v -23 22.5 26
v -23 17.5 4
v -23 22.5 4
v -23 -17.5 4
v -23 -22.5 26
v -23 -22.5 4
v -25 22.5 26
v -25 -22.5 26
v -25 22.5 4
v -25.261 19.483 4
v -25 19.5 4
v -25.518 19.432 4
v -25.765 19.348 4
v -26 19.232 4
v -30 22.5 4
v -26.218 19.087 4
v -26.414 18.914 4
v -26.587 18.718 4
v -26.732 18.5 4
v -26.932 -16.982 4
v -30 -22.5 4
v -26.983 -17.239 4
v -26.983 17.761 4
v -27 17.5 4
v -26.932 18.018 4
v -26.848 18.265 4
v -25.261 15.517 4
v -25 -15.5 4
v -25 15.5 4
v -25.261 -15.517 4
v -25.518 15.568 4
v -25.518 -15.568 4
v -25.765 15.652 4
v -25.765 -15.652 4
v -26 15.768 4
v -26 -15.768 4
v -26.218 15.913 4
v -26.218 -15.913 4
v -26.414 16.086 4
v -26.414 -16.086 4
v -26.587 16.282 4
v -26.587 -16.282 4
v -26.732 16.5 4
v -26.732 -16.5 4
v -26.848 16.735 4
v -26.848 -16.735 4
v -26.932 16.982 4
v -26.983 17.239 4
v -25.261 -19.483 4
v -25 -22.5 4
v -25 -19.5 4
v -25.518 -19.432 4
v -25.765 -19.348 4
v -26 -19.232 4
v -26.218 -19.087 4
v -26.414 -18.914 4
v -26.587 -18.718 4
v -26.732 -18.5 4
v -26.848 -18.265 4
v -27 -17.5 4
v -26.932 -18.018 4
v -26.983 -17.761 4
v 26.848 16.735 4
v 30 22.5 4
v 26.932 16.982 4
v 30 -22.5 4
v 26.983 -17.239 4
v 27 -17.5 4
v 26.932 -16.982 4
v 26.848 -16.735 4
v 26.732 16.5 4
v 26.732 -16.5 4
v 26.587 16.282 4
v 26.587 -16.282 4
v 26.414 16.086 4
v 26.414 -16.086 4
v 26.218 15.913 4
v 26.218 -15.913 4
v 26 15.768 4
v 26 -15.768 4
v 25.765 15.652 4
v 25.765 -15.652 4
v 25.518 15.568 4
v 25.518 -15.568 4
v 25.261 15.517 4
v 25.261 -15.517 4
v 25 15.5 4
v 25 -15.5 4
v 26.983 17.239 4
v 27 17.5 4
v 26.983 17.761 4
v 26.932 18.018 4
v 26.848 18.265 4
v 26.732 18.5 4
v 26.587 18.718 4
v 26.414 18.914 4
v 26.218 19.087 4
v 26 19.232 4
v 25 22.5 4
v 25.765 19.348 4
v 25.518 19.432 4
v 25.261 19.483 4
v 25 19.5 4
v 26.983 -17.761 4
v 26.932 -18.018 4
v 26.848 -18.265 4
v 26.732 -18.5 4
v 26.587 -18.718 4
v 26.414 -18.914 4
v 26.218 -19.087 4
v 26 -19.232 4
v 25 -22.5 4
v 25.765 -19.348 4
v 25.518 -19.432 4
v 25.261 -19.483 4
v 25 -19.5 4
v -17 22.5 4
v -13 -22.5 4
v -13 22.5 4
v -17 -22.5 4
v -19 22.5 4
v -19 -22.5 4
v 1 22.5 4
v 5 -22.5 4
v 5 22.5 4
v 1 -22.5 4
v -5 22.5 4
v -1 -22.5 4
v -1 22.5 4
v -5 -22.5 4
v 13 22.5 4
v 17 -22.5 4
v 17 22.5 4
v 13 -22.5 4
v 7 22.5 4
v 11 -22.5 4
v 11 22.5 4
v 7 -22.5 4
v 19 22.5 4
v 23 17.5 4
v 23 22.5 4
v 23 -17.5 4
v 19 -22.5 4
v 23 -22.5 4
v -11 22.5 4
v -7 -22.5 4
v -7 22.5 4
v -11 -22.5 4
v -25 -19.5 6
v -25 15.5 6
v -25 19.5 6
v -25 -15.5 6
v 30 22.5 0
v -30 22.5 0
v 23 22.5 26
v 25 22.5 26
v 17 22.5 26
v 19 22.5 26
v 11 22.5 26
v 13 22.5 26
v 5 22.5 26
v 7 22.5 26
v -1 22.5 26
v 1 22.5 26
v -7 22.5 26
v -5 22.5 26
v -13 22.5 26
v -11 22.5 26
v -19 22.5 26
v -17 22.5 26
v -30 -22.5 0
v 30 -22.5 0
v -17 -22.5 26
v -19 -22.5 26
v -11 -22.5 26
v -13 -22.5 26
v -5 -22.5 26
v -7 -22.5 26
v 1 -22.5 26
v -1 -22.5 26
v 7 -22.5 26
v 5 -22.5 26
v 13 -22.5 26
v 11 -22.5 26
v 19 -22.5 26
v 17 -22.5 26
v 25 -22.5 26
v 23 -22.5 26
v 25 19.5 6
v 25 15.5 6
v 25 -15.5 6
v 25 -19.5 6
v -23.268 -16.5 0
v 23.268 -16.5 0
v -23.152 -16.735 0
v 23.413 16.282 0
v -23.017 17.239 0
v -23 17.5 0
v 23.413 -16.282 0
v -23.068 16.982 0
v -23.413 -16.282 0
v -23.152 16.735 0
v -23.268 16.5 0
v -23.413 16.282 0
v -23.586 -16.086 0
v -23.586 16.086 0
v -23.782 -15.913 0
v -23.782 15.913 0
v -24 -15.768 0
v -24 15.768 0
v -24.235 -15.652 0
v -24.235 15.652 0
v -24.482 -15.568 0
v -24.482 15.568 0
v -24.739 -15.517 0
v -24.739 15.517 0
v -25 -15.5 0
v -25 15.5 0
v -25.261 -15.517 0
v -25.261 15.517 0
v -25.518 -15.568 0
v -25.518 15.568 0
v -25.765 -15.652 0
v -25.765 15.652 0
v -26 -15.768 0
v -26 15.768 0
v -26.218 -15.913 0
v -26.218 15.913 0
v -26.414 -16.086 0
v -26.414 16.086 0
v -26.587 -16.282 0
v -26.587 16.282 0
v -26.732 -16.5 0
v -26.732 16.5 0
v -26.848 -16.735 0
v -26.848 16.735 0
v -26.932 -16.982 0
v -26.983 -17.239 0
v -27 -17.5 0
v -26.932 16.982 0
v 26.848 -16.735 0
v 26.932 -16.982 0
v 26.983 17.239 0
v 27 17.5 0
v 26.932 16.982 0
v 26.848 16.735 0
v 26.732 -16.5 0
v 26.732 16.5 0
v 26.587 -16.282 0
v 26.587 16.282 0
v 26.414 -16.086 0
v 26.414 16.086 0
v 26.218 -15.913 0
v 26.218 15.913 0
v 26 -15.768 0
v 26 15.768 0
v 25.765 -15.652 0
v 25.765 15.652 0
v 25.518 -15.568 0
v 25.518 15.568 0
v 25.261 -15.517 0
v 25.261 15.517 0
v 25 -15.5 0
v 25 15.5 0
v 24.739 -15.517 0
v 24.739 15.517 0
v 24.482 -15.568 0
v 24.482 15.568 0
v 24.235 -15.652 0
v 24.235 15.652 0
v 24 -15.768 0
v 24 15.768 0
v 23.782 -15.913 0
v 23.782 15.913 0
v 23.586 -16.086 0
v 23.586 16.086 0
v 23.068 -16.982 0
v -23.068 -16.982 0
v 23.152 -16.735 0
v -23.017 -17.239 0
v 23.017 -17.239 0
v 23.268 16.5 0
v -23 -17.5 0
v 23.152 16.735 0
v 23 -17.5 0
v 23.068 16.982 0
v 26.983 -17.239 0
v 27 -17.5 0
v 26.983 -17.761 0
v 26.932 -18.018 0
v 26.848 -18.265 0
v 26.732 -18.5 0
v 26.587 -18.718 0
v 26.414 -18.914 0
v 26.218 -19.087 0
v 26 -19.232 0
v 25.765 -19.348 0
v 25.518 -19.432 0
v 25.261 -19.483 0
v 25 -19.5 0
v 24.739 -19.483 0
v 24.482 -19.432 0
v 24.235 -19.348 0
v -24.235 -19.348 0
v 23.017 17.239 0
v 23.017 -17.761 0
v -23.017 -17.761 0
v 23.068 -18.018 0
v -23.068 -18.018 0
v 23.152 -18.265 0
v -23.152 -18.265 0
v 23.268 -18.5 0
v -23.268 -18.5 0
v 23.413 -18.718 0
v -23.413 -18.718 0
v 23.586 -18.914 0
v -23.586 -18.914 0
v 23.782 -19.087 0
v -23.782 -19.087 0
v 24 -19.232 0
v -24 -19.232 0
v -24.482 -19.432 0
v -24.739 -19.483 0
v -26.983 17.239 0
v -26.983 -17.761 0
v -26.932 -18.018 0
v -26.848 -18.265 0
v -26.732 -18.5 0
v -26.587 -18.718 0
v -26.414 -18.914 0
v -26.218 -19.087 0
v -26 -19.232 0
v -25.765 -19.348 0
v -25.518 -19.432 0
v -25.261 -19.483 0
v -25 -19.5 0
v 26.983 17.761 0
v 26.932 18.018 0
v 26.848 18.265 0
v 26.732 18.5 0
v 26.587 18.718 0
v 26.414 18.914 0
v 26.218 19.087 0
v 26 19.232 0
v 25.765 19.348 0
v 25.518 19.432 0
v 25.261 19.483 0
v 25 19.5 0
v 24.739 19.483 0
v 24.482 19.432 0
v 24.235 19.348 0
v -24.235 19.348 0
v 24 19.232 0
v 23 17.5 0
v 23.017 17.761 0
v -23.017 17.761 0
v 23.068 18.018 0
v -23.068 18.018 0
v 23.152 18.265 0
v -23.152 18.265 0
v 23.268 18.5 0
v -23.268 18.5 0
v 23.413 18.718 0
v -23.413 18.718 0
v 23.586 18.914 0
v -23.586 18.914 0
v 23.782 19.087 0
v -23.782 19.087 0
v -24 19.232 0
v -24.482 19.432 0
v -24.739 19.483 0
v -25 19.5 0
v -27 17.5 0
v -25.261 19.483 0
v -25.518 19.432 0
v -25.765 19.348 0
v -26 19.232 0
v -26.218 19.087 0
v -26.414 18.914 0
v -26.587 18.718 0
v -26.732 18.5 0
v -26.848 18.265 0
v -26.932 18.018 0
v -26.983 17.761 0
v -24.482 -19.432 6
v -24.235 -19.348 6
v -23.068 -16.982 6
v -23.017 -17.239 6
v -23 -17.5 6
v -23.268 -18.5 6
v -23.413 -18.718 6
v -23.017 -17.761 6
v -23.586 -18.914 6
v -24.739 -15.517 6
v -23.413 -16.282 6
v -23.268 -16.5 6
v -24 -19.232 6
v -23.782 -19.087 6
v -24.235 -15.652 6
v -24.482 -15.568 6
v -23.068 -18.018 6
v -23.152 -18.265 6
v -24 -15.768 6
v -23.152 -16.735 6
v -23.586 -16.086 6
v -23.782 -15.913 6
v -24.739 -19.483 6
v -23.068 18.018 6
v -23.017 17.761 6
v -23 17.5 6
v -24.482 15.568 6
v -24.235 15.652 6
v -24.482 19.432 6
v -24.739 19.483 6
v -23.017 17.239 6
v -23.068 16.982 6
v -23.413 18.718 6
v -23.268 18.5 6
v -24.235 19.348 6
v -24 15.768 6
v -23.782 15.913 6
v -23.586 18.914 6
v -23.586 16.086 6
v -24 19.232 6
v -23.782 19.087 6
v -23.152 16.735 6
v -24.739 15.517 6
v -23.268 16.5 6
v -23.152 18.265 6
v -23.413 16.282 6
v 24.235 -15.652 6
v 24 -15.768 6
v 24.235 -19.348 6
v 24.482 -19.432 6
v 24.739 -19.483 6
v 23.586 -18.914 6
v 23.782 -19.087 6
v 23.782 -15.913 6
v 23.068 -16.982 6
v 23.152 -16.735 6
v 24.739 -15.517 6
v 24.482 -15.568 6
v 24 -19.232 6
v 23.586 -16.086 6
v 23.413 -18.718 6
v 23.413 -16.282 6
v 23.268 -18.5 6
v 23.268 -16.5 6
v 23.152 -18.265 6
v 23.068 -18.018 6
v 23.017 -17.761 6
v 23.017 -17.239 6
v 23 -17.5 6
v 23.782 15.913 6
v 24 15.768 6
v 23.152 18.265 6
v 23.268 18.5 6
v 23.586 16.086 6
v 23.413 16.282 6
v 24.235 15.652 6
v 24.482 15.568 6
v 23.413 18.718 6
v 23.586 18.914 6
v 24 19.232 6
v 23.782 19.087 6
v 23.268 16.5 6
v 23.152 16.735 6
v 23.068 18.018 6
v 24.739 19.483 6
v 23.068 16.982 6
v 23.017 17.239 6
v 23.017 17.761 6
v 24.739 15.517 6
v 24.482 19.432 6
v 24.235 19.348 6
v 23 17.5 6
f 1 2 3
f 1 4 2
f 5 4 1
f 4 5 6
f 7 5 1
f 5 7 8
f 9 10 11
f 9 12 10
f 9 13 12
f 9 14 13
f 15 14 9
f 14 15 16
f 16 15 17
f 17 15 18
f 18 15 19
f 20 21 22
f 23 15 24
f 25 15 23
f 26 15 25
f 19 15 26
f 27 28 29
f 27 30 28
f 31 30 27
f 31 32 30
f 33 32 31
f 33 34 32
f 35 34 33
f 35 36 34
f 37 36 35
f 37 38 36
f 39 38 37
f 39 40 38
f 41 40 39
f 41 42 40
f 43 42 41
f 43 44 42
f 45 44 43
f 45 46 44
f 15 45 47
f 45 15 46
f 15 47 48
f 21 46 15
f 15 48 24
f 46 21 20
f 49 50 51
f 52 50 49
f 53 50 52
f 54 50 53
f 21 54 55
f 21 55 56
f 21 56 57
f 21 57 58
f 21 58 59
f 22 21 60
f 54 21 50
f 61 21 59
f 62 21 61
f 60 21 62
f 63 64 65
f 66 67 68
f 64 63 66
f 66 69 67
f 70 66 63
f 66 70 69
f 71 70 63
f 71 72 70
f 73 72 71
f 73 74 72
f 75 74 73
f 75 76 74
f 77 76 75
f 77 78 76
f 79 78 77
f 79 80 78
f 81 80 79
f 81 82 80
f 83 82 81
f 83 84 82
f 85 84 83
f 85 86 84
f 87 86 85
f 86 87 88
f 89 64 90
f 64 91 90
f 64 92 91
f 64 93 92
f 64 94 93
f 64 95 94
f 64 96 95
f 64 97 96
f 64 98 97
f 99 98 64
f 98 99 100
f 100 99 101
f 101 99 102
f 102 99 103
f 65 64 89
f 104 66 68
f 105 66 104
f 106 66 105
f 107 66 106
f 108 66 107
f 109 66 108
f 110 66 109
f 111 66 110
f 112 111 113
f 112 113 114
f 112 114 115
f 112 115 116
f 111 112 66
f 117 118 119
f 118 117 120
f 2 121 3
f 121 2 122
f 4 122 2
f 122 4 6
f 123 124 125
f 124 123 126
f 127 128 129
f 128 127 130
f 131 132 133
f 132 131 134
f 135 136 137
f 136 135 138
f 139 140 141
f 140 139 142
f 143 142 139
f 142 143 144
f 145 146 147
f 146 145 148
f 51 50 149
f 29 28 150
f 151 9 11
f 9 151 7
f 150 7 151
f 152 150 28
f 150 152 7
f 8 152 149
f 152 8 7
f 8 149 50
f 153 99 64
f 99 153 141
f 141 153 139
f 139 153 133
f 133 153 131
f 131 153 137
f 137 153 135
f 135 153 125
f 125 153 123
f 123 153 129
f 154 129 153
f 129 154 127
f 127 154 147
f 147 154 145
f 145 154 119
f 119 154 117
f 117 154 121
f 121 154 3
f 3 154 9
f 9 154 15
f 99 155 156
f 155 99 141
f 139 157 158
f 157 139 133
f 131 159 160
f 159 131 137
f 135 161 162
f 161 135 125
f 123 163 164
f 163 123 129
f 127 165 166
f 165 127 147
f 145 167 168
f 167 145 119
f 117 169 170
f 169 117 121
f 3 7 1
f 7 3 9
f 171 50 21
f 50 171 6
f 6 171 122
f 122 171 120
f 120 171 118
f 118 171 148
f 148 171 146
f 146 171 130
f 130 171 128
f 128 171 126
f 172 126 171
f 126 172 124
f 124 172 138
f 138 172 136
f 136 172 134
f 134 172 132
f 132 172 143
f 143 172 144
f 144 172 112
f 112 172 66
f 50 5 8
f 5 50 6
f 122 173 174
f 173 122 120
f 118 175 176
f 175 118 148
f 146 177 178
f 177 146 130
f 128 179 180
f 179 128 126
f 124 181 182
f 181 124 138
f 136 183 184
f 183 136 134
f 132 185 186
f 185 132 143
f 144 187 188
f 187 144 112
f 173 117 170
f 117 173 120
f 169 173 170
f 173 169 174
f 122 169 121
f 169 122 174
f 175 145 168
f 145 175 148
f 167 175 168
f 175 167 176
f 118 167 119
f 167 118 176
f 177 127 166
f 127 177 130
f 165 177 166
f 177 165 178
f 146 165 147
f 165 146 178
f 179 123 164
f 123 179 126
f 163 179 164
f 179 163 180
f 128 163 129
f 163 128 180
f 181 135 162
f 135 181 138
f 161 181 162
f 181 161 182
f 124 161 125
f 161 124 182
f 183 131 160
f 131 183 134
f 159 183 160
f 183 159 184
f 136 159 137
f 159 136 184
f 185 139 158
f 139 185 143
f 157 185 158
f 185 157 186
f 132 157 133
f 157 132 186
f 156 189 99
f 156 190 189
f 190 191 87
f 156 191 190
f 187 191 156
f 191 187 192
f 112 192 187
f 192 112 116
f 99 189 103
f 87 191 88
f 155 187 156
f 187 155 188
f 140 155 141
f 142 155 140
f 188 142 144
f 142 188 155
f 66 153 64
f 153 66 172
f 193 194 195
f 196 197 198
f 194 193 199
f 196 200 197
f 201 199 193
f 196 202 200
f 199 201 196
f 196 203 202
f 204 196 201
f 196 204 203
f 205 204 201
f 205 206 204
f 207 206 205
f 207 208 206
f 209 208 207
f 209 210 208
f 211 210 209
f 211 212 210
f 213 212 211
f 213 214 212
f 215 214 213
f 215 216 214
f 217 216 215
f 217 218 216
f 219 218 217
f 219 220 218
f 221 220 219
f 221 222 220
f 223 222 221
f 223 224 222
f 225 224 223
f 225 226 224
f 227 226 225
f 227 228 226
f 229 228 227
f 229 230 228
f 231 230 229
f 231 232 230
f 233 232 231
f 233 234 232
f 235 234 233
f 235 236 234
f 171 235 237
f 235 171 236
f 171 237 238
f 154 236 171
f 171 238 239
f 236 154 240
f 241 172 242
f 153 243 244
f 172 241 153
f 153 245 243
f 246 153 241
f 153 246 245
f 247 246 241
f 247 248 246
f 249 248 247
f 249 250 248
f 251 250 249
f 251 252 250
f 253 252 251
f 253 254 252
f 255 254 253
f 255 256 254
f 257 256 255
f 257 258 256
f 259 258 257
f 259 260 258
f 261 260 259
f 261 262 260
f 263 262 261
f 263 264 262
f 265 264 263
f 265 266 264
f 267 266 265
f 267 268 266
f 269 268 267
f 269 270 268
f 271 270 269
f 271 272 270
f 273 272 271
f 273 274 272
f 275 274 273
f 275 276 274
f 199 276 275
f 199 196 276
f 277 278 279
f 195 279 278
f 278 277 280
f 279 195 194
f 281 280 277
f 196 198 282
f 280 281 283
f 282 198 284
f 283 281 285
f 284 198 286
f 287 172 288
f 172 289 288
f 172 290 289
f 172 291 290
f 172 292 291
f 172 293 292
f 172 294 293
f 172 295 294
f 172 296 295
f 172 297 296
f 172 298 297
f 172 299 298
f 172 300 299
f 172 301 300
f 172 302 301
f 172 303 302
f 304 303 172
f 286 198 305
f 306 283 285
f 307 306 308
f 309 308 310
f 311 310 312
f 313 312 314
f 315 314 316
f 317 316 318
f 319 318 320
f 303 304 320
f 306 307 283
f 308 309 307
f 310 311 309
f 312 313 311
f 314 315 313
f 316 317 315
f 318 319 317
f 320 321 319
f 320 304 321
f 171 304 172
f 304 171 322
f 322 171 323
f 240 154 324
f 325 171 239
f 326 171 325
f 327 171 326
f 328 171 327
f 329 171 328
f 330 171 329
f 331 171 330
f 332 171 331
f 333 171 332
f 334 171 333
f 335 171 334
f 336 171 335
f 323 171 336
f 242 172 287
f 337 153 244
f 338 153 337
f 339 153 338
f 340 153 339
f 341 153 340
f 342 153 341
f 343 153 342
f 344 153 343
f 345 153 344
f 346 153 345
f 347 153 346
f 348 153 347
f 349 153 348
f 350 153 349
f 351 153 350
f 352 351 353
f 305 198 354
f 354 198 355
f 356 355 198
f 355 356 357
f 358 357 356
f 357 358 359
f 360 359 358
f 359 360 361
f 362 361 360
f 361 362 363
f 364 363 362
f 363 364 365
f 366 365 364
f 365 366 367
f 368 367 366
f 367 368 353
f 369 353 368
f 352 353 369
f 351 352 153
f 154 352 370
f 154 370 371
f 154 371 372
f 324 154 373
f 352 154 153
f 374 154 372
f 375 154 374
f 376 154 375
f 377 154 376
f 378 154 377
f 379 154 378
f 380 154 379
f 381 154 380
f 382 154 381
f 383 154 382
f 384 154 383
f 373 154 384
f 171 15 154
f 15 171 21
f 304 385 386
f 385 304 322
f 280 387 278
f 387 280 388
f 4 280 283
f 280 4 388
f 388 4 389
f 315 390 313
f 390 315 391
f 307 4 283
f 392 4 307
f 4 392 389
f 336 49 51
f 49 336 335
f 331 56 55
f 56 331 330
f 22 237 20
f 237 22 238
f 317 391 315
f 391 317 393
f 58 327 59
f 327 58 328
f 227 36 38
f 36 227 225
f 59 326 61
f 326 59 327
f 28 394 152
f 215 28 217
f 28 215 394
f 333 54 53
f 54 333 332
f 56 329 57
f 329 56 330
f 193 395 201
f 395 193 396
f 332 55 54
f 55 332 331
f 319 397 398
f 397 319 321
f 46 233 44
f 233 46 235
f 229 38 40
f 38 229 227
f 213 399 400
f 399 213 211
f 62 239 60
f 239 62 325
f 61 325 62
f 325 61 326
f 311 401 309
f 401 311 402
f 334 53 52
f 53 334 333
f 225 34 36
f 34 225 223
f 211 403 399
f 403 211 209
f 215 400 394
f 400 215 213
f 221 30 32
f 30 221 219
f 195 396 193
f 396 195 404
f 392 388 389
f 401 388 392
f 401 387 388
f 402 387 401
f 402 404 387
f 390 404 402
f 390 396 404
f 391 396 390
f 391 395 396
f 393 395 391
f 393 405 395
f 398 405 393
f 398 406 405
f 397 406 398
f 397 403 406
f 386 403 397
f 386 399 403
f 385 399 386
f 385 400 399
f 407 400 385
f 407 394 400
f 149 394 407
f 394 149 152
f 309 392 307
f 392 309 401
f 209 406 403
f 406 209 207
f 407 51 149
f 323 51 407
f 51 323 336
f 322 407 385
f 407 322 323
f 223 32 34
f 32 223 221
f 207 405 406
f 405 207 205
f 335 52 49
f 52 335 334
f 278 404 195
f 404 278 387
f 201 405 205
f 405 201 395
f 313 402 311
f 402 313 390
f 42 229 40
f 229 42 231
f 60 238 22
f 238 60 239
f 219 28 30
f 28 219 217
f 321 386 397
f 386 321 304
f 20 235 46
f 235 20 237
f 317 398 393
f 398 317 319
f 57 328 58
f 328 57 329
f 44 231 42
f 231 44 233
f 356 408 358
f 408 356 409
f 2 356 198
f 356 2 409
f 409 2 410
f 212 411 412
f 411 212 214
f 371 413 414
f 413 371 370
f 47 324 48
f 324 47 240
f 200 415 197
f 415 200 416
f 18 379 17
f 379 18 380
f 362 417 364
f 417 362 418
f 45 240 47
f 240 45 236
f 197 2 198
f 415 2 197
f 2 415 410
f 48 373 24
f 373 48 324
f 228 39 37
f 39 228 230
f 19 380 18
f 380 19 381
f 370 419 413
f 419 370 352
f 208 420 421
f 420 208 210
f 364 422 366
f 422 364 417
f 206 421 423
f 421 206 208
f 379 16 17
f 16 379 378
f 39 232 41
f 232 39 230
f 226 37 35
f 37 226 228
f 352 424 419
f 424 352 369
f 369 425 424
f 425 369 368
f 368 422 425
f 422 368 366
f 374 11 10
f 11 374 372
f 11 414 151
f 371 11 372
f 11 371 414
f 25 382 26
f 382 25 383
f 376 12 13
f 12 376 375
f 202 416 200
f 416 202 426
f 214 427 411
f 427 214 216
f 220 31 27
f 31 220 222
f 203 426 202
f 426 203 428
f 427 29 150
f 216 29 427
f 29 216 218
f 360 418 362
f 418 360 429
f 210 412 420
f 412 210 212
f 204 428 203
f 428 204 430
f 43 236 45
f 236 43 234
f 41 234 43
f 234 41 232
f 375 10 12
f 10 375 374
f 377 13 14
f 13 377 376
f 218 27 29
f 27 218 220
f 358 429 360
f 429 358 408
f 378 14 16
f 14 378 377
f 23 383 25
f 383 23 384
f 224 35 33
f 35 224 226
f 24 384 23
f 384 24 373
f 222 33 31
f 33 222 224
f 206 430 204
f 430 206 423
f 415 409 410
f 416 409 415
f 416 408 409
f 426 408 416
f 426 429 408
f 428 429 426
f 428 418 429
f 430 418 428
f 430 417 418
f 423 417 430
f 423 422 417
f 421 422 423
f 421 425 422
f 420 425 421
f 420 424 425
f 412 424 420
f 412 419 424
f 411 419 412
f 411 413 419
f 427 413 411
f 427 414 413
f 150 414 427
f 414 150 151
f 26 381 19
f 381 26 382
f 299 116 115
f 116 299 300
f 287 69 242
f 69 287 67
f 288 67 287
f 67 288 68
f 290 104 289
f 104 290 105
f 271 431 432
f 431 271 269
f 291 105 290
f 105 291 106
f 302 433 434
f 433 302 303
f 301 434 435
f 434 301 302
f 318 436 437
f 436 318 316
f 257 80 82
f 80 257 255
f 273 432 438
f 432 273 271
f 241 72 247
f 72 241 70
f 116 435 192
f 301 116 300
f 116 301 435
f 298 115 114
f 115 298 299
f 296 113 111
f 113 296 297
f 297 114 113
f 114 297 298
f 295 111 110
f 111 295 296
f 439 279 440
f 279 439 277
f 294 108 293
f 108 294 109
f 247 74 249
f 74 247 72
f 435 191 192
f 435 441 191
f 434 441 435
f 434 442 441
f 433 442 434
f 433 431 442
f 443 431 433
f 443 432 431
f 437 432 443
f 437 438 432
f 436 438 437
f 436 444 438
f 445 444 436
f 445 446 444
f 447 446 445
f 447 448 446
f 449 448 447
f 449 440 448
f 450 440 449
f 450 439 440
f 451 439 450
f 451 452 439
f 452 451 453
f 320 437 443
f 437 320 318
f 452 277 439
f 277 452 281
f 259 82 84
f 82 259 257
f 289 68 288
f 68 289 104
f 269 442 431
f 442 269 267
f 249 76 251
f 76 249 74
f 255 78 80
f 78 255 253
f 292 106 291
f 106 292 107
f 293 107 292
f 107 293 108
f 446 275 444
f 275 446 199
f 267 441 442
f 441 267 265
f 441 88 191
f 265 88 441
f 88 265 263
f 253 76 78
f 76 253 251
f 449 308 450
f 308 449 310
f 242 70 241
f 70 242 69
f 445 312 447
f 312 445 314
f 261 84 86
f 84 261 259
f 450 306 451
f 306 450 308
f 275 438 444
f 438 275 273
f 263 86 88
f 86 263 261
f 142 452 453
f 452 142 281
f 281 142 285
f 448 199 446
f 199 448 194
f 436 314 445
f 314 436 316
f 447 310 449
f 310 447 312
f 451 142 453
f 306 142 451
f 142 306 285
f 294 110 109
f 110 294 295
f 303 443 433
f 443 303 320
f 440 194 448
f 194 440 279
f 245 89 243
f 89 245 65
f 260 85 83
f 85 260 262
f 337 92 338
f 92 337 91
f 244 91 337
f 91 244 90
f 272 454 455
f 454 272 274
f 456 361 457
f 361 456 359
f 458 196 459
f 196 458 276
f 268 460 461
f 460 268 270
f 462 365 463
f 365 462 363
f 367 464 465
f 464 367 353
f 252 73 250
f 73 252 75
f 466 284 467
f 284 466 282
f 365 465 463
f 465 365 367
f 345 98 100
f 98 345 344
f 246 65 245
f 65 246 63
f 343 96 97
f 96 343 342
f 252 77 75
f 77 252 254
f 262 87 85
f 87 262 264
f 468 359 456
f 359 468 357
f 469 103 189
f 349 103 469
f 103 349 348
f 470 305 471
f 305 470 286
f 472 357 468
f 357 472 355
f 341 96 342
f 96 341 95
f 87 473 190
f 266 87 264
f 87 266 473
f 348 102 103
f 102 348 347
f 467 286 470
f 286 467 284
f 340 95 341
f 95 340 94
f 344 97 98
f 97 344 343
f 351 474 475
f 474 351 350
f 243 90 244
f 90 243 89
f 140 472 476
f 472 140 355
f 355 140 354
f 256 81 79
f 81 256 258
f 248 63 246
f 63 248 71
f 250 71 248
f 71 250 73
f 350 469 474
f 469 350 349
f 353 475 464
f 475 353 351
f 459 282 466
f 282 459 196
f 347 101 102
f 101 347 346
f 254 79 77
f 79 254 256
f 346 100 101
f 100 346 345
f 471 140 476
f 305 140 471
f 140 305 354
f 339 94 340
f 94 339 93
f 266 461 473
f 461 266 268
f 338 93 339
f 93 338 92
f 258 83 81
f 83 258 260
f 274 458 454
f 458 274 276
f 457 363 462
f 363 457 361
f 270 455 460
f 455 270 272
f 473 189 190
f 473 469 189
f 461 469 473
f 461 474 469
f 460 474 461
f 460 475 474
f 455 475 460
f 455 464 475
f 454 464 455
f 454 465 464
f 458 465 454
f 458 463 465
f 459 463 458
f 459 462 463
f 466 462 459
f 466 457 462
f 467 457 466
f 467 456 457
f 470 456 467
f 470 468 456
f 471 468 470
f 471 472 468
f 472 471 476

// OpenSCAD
$fn = 48;
module heatsink() {
    difference() {
        union() {
            translate([-30,-22.5,0]) cube([60,45,4]);
            for (x=[-24:6:24]) translate([x-1,-22.5,4]) cube([2,45,22]);
        }
        for (x=[-25,25]) for (y=[-17.5,17.5]) translate([x,y,-1]) cylinder(h=7,d=4);
    }
}
heatsink();
